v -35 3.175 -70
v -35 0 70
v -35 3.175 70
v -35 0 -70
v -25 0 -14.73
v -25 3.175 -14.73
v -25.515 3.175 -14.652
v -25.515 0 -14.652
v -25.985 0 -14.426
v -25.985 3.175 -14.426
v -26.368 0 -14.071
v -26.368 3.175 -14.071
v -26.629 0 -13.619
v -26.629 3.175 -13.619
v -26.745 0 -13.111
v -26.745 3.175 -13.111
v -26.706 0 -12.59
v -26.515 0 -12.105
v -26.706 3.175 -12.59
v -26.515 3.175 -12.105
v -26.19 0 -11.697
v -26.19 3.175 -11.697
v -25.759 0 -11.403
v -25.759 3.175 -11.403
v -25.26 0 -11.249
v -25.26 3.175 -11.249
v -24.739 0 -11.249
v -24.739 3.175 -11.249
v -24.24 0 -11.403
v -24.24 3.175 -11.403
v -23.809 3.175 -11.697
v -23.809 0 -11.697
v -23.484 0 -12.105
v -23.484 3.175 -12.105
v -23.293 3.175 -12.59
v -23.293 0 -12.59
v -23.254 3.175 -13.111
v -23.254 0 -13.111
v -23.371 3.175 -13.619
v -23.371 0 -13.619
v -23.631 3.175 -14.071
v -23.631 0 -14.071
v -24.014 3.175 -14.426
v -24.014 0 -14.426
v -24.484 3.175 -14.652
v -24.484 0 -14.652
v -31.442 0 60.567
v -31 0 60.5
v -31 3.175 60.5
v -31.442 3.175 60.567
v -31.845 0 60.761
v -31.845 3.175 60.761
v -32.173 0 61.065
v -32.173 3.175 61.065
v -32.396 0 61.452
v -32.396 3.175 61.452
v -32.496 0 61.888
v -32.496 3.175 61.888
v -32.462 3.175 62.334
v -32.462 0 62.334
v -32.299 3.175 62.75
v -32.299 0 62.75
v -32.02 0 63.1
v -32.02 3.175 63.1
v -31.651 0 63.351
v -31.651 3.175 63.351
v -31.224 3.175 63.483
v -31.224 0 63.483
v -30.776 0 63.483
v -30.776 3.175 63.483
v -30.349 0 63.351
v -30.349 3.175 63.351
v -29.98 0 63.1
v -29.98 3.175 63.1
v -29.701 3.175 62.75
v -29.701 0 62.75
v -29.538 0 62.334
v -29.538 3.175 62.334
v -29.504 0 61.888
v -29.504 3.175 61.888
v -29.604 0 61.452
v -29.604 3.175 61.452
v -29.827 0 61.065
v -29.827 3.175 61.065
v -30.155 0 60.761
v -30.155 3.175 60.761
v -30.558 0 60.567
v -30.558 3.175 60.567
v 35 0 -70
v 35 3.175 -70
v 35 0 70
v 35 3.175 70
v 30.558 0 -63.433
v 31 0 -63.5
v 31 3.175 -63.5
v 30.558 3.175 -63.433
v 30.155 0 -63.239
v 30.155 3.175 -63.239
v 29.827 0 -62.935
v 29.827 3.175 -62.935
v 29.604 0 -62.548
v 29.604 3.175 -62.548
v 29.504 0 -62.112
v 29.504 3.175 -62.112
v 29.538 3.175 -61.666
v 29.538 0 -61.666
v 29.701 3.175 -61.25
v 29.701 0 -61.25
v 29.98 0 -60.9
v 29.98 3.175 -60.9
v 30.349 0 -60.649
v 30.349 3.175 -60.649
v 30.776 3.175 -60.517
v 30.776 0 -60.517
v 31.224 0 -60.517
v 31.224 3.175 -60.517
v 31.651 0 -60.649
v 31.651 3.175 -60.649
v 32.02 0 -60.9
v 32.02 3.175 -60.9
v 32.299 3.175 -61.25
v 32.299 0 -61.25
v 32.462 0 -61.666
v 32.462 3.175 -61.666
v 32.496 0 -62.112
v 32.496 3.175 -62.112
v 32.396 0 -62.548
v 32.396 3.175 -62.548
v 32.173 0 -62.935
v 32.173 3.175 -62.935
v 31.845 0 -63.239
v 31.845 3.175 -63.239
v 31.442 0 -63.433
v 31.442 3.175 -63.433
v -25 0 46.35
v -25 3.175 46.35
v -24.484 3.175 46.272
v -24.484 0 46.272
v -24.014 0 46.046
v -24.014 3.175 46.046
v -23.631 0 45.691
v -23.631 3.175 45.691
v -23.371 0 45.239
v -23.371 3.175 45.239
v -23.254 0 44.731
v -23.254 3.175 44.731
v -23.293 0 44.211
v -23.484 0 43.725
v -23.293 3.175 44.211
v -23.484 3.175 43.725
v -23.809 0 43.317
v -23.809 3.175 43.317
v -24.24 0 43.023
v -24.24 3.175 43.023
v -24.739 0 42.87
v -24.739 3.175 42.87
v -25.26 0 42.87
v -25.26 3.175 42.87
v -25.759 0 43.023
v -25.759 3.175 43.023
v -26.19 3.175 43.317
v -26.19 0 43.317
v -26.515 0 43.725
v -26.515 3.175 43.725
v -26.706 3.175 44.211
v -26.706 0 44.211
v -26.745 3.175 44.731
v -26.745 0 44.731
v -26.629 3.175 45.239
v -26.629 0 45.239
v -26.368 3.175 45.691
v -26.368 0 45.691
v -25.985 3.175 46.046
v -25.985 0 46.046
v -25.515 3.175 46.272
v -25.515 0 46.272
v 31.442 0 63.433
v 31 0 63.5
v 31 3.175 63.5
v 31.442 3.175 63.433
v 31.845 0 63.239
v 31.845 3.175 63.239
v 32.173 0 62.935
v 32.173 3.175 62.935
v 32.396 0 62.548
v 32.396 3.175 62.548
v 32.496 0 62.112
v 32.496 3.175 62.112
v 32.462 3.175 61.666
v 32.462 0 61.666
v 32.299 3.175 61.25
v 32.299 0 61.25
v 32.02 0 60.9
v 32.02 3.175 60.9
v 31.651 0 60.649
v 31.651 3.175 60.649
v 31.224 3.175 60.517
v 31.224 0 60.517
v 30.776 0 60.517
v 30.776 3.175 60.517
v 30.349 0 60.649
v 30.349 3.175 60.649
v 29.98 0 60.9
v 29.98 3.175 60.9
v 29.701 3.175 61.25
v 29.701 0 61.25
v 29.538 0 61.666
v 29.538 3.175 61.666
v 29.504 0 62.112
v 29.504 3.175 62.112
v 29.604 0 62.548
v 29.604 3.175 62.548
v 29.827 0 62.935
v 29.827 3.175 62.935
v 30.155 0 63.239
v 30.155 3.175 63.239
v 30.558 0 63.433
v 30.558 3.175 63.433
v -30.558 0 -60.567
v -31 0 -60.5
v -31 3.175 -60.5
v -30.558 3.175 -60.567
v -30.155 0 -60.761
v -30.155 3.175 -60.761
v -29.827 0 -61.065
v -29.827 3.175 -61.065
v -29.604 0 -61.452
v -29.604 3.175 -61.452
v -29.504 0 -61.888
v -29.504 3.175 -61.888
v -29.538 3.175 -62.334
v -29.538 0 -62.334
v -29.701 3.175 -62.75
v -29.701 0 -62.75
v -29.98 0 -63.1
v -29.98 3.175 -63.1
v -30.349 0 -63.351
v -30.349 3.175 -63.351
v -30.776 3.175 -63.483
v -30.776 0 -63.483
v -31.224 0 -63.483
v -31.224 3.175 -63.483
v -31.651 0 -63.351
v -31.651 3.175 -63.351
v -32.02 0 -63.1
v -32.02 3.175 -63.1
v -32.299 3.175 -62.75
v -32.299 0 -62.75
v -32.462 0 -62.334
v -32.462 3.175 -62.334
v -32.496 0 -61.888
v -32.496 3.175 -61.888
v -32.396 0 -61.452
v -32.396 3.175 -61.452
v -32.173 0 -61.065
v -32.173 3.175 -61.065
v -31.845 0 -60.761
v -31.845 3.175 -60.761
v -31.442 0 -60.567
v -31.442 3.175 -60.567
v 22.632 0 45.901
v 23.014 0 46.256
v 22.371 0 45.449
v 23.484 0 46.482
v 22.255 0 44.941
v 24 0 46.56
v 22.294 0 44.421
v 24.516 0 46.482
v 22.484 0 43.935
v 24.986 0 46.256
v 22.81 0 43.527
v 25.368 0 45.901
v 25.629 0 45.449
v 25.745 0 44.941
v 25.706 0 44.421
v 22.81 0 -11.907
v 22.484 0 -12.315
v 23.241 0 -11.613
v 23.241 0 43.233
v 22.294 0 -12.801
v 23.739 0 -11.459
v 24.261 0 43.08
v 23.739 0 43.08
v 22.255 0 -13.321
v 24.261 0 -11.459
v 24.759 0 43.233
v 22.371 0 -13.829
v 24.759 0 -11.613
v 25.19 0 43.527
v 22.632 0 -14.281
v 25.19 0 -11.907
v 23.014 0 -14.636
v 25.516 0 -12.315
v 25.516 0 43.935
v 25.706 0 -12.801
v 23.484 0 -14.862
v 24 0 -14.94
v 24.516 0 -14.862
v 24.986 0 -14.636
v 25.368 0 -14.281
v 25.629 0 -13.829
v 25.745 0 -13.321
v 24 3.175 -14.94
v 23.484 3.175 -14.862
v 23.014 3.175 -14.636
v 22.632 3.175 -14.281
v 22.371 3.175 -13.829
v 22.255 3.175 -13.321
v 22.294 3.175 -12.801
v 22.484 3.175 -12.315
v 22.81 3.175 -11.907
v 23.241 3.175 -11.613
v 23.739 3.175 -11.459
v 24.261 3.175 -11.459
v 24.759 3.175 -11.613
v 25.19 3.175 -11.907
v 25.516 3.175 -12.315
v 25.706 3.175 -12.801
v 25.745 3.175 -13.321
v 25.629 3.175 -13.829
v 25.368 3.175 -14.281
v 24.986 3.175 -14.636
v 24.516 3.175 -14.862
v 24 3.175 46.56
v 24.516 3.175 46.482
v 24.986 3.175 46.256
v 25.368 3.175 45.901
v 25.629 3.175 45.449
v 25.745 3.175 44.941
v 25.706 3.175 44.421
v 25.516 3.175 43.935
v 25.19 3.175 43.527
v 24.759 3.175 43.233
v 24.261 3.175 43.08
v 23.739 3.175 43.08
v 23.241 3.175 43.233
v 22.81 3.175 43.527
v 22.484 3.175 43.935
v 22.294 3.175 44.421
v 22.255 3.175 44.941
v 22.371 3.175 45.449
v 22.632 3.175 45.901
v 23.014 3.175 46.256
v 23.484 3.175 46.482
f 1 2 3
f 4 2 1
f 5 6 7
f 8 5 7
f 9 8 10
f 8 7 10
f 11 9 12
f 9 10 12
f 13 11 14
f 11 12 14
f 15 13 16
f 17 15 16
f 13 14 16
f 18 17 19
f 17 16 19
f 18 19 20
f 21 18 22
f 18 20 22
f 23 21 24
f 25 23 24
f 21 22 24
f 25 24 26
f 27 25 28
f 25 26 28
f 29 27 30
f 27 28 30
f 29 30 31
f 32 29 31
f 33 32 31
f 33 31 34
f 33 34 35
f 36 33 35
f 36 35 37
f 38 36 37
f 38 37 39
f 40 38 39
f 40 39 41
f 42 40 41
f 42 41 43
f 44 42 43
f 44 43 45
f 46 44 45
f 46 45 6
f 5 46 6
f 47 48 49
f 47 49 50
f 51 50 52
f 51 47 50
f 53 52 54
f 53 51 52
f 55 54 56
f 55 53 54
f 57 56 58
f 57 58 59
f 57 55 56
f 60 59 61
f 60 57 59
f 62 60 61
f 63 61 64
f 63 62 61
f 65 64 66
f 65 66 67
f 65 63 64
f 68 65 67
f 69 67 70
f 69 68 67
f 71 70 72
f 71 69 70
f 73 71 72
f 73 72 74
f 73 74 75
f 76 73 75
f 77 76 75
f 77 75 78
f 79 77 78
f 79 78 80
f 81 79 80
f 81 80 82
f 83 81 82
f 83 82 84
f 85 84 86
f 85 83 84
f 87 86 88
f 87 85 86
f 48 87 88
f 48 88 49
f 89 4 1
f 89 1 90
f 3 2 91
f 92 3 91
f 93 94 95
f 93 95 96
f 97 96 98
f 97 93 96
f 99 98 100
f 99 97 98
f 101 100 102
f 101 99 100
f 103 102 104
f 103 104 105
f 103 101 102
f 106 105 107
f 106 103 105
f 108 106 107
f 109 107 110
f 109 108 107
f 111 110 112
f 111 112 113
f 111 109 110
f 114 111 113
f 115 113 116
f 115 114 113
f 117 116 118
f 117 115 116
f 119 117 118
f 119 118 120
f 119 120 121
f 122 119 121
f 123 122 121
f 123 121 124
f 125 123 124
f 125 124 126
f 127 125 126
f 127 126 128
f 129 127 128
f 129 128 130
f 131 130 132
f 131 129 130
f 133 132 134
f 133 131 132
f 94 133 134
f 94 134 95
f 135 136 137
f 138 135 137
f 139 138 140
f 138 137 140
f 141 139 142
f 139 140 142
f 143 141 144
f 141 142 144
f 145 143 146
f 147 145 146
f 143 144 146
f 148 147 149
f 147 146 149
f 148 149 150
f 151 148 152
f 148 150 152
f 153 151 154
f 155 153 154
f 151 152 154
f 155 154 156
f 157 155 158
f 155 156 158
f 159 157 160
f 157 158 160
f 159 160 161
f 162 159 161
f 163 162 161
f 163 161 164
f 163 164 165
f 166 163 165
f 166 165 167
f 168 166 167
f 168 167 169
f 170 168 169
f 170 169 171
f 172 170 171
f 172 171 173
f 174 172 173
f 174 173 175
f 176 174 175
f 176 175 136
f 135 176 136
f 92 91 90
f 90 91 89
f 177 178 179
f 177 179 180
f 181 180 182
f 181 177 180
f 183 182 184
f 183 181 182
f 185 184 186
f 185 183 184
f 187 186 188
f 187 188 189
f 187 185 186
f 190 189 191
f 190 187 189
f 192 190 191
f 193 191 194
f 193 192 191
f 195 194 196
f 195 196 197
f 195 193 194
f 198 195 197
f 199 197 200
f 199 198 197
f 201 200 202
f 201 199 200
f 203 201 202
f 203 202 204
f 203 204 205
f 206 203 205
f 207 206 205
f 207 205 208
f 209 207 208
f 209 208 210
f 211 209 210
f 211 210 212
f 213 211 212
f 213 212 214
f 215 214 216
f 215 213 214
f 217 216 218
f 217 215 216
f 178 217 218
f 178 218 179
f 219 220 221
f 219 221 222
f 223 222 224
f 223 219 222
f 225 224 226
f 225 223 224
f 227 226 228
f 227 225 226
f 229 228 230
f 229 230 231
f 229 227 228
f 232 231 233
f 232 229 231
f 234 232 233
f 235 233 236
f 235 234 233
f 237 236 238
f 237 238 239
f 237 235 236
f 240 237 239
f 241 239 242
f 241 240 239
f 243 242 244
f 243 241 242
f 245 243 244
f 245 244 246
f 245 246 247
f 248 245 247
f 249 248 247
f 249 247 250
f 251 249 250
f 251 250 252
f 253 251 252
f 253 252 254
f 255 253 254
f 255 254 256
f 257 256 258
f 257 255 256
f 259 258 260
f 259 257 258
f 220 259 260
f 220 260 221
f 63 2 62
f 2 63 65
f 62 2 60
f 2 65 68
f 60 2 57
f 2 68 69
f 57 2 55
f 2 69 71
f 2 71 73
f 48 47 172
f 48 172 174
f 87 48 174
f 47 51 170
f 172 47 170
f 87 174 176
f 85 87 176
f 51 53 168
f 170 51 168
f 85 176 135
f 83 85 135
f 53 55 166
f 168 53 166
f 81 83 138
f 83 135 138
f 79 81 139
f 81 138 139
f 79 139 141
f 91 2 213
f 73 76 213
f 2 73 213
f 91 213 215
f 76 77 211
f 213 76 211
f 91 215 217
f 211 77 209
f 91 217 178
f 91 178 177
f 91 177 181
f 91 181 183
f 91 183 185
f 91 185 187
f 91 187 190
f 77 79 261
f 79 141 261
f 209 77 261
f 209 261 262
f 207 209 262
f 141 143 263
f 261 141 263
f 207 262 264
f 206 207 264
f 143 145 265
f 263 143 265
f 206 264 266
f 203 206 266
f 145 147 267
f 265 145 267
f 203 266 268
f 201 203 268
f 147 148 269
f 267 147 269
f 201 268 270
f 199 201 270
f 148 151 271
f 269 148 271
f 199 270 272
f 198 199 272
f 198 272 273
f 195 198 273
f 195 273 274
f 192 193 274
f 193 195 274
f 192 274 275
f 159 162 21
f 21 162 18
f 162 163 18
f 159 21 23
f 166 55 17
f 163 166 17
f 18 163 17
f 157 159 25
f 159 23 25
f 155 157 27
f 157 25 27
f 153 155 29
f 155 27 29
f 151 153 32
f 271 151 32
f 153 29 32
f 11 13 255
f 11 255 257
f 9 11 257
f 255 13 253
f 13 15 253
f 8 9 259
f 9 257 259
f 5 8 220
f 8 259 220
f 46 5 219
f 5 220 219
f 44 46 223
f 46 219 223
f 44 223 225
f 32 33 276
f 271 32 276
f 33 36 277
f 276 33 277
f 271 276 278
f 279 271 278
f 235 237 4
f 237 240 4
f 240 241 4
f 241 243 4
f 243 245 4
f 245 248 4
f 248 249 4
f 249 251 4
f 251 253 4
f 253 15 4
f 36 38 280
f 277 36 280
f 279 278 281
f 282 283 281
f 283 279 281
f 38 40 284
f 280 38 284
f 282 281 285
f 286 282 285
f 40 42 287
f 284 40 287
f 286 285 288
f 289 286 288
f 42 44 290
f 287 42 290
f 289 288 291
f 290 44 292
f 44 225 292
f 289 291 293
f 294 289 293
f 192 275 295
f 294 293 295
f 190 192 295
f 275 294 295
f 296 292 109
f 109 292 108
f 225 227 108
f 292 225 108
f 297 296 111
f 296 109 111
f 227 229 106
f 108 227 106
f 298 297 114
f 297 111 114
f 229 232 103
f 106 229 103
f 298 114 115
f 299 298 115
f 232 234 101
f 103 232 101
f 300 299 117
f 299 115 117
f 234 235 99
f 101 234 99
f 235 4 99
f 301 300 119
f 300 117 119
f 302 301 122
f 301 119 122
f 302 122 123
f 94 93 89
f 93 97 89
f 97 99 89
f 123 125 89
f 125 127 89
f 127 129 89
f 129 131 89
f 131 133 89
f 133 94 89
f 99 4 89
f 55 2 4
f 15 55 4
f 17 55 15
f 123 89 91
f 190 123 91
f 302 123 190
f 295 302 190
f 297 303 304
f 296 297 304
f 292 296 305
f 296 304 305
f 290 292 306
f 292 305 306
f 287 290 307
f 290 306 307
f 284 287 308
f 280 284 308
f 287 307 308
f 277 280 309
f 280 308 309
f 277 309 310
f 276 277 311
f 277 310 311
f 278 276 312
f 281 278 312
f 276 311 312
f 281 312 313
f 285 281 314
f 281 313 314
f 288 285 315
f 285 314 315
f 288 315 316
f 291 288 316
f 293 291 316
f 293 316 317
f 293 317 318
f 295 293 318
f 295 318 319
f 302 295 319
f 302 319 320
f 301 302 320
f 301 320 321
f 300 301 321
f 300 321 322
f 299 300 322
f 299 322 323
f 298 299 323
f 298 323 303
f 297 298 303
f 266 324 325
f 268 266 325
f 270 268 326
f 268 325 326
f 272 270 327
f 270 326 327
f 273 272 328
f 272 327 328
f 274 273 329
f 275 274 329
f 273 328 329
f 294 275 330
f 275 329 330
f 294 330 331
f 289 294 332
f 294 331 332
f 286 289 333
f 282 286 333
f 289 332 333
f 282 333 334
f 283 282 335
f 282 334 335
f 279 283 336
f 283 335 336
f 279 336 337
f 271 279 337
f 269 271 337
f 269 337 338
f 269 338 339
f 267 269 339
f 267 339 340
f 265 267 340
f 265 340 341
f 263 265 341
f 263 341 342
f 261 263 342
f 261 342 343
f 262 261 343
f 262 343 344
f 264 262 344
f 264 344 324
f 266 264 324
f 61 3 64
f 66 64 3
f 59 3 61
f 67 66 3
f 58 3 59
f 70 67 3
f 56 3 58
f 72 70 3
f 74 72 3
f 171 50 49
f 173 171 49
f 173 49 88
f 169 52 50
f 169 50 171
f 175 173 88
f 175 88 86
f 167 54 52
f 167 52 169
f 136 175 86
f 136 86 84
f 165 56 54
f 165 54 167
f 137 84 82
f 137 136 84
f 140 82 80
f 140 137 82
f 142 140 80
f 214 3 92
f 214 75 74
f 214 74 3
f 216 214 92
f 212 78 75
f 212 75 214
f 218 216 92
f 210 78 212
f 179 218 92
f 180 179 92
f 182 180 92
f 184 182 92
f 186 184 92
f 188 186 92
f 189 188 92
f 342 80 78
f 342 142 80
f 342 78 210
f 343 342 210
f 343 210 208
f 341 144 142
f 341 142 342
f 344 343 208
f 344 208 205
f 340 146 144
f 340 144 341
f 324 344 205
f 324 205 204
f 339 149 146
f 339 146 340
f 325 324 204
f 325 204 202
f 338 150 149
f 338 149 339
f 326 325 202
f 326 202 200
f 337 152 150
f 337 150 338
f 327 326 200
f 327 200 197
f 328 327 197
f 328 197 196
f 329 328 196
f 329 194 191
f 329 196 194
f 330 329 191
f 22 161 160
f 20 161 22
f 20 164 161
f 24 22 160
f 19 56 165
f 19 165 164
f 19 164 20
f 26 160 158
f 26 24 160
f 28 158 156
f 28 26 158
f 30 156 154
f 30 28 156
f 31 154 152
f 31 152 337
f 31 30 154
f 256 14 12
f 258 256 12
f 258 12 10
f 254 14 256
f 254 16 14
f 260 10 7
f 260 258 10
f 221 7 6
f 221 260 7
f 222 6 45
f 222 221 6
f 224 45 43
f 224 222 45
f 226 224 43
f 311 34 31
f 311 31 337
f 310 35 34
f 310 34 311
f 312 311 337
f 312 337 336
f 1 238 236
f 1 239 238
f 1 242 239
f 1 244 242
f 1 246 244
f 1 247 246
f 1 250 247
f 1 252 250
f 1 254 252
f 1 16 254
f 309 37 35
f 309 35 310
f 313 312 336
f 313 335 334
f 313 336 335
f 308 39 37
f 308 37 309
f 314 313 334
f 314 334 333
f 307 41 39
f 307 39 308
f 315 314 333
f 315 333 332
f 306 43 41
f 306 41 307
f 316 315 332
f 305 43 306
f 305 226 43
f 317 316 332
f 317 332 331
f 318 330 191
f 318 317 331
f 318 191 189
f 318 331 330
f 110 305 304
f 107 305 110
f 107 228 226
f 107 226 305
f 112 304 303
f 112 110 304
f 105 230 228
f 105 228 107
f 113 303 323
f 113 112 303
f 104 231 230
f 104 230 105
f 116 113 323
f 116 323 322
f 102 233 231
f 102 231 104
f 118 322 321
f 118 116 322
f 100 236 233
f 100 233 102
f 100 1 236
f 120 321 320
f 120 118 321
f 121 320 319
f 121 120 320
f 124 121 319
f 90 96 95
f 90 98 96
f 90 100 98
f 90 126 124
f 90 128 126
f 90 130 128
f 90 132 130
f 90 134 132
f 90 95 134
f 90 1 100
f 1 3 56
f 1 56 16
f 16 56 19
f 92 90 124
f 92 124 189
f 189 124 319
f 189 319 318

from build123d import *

# Parameters (mm, degrees)
SKETCH2_W           = 70
SKETCH2_H           = 140
SKETCH2_R           = 1.5
BOSS_EXTRUDE1_DEPTH = 3.175
SKETCH3_R           = 1.75
CUT_EXTRUDE1_DEPTH  = 79.326755486


with BuildPart() as part:
    # Sketch2 → Boss-Extrude1 (new body)
    with BuildSketch(Plane(origin=(0, 0, 0), x_dir=(1, 0, 0), z_dir=(0, 1, 0))):
        Rectangle(SKETCH2_W, SKETCH2_H)
        with Locations(Location((31, -62, 0), (0, 0, 270))):
            Circle(SKETCH2_R, mode=Mode.SUBTRACT)
        with Locations(Location((31, 62, 0), (0, 0, 90))):
            Circle(SKETCH2_R, mode=Mode.SUBTRACT)
        with Locations(Location((-31, 62, 0), (0, 0, 270))):
            Circle(SKETCH2_R, mode=Mode.SUBTRACT)
        with Locations(Location((-31, -62, 0), (0, 0, 90))):
            Circle(SKETCH2_R, mode=Mode.SUBTRACT)
    extrude(amount=BOSS_EXTRUDE1_DEPTH)

    # Sketch3 → Cut-Extrude1 (cut, through all)
    with BuildSketch(Plane(origin=(0, 3.175, 0), x_dir=(1, 0, 0), z_dir=(0, 1, 0))):
        with Locations(Location((-24.999549753, -44.6, 0), (0, 0, 270))):
            Circle(SKETCH3_R)
        with Locations(Location((24, -44.810057195, 0), (0, 0, 270))):
            Circle(SKETCH3_R)
        with Locations(Location((24, 13.189942805, 0), (0, 0, 90))):
            Circle(SKETCH3_R)
        with Locations(Location((-24.999549753, 12.97988561, 0), (0, 0, 90))):
            Circle(SKETCH3_R)
    extrude(amount=-CUT_EXTRUDE1_DEPTH, mode=Mode.SUBTRACT)


solid = part.part
